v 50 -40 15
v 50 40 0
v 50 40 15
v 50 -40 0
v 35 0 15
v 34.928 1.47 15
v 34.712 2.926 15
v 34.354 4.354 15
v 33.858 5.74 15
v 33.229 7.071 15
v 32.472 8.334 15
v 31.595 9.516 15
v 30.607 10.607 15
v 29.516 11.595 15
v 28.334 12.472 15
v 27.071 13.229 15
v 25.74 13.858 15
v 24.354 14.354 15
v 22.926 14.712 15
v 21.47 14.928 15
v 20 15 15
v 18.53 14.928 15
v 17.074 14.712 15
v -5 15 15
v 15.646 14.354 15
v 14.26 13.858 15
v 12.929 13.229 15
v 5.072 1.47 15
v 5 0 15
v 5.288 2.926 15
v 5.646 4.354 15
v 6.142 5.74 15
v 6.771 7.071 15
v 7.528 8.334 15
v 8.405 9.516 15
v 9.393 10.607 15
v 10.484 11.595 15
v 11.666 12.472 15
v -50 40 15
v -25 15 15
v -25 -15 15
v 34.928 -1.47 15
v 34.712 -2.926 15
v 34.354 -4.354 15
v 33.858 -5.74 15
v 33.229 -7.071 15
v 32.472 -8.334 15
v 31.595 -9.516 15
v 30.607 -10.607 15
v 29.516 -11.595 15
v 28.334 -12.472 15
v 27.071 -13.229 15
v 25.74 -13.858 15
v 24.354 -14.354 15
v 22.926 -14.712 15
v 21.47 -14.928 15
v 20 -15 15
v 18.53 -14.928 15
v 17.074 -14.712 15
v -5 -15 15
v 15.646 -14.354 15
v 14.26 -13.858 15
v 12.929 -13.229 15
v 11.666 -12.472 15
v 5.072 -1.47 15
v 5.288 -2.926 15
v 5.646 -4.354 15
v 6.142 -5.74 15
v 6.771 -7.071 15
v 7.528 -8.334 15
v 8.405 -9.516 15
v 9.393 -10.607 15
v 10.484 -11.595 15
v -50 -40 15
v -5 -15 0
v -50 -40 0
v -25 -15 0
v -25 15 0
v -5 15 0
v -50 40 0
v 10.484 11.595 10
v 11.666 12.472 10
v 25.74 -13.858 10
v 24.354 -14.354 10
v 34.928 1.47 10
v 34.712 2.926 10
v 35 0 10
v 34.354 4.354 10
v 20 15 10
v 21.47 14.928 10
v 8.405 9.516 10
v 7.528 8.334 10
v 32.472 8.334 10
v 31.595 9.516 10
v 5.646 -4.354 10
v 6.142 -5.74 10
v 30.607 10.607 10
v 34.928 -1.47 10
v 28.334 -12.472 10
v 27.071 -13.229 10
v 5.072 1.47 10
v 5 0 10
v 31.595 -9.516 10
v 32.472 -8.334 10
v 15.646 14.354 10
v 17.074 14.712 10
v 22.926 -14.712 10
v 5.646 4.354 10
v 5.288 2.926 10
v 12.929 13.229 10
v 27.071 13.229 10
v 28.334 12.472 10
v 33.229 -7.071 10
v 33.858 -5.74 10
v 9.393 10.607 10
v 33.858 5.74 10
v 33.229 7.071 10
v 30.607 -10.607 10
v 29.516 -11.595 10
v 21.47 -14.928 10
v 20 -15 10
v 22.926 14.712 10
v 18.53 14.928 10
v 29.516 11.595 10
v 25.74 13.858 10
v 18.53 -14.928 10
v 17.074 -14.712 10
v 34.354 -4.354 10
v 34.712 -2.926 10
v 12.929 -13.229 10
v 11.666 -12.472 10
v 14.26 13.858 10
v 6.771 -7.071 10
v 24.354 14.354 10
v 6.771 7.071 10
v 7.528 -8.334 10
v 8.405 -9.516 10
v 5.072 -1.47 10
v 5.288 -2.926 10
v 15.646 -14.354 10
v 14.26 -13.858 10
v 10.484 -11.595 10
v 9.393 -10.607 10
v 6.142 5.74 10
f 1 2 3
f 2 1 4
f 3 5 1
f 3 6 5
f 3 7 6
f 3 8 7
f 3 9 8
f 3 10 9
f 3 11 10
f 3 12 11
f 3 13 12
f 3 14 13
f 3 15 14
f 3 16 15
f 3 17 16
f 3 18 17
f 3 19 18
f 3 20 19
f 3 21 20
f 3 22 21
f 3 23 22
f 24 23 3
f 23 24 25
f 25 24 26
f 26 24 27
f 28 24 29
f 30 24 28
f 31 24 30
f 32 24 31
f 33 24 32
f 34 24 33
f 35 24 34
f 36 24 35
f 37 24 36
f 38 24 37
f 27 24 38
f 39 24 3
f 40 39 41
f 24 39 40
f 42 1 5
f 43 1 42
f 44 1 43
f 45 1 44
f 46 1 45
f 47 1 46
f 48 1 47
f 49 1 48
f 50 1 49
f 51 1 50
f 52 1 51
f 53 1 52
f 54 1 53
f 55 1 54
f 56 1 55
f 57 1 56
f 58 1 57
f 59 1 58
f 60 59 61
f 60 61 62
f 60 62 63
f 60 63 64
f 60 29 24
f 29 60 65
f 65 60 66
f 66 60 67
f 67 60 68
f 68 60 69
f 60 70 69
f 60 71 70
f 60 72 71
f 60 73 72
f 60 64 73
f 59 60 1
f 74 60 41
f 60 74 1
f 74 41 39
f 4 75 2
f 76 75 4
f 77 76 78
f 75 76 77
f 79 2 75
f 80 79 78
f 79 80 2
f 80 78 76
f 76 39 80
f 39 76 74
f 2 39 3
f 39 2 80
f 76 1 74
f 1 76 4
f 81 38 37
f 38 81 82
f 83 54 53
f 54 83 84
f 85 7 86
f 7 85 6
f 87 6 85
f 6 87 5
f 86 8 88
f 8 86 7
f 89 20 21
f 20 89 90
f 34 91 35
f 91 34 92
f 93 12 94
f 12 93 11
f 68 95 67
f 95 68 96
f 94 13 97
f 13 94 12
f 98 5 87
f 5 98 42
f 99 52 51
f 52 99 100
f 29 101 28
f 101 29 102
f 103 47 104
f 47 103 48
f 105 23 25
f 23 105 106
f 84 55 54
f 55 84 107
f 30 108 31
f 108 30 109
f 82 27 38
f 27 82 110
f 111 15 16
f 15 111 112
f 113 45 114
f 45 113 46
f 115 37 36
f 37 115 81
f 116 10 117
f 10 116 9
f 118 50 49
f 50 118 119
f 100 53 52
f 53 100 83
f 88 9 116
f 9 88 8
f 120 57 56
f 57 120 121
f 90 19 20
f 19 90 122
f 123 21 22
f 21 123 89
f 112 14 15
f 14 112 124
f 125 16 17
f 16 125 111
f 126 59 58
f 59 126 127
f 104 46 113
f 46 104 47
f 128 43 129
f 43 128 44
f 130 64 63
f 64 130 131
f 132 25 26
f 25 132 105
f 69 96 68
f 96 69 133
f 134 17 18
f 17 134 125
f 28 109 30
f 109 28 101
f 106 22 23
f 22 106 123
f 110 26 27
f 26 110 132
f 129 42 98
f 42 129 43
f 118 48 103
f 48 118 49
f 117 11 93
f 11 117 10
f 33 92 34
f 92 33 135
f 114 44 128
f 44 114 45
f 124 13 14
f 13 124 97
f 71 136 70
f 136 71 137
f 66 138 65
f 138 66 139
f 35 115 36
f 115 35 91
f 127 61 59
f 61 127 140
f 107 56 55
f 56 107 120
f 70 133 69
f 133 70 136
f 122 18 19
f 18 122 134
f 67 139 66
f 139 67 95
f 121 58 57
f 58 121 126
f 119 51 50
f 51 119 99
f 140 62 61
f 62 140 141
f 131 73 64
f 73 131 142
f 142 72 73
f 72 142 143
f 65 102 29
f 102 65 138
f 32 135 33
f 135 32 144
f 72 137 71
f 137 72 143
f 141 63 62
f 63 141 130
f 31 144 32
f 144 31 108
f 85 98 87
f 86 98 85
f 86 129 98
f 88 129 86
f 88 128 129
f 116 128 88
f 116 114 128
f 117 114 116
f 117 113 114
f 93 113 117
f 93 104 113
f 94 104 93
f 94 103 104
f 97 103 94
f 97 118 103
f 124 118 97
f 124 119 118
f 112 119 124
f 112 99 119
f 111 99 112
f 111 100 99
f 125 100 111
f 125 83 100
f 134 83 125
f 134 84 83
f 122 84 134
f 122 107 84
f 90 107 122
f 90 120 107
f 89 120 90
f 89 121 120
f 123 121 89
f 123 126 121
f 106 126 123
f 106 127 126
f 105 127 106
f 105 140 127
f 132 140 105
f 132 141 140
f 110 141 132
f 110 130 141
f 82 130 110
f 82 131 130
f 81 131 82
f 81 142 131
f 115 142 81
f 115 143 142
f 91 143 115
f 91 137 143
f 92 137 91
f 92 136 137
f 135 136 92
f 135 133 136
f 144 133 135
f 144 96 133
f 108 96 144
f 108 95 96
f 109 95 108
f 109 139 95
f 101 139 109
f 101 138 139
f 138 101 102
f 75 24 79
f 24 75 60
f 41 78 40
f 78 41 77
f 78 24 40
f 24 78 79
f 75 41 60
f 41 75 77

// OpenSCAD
// --------------------------------------------------------
// Simulating a CATIA "Pocket" (Cutout) in OpenSCAD
// --------------------------------------------------------

/* Toggle this to 'true' to see the actual volumes 
   being used as cutting tools before they are subtracted.
*/
show_cutting_tools = false;

// Base Part Parameters
plate_length = 100;
plate_width = 80;
plate_thickness = 15;

if (show_cutting_tools) {
    // Show both the base and the tools (overlapping)
    base_plate();
    blind_pocket_tool();
    through_hole_tool();
} else {
    // Perform the CSG Subtraction
    difference() {
        base_plate();
        blind_pocket_tool();
        through_hole_tool();
    }
}

// --------------------------------------------------------
// Geometry Modules
// --------------------------------------------------------

module base_plate() {
    color("LightSlateGray")
    // Creating the base centered at [0,0,0]
    translate([-plate_length/2, -plate_width/2, 0])
        cube([plate_length, plate_width, plate_thickness]);
}

module blind_pocket_tool() {
    // Simulating a CATIA "Dimension" (Blind) Pocket
    pocket_depth = 5;
    pocket_radius = 15;
    
    color("Red")
    // Position the pocket on the right side of the plate
    translate([20, 0, plate_thickness - pocket_depth])
        // Notice the + 1 to the height to avoid Z-fighting at the top surface
        cylinder(h = pocket_depth + 1, r = pocket_radius, $fn=64);
}

module through_hole_tool() {
    // Simulating a CATIA "Up to Last" Pocket (Through-hole)
    color("DarkOrange")
    // Position on the left side
    translate([-25, -15, -1]) // Moved down by 1mm to break the bottom surface
        // Notice the + 2 to the height so it completely breaches top and bottom
        cube([20, 30, plate_thickness + 2]);
}
